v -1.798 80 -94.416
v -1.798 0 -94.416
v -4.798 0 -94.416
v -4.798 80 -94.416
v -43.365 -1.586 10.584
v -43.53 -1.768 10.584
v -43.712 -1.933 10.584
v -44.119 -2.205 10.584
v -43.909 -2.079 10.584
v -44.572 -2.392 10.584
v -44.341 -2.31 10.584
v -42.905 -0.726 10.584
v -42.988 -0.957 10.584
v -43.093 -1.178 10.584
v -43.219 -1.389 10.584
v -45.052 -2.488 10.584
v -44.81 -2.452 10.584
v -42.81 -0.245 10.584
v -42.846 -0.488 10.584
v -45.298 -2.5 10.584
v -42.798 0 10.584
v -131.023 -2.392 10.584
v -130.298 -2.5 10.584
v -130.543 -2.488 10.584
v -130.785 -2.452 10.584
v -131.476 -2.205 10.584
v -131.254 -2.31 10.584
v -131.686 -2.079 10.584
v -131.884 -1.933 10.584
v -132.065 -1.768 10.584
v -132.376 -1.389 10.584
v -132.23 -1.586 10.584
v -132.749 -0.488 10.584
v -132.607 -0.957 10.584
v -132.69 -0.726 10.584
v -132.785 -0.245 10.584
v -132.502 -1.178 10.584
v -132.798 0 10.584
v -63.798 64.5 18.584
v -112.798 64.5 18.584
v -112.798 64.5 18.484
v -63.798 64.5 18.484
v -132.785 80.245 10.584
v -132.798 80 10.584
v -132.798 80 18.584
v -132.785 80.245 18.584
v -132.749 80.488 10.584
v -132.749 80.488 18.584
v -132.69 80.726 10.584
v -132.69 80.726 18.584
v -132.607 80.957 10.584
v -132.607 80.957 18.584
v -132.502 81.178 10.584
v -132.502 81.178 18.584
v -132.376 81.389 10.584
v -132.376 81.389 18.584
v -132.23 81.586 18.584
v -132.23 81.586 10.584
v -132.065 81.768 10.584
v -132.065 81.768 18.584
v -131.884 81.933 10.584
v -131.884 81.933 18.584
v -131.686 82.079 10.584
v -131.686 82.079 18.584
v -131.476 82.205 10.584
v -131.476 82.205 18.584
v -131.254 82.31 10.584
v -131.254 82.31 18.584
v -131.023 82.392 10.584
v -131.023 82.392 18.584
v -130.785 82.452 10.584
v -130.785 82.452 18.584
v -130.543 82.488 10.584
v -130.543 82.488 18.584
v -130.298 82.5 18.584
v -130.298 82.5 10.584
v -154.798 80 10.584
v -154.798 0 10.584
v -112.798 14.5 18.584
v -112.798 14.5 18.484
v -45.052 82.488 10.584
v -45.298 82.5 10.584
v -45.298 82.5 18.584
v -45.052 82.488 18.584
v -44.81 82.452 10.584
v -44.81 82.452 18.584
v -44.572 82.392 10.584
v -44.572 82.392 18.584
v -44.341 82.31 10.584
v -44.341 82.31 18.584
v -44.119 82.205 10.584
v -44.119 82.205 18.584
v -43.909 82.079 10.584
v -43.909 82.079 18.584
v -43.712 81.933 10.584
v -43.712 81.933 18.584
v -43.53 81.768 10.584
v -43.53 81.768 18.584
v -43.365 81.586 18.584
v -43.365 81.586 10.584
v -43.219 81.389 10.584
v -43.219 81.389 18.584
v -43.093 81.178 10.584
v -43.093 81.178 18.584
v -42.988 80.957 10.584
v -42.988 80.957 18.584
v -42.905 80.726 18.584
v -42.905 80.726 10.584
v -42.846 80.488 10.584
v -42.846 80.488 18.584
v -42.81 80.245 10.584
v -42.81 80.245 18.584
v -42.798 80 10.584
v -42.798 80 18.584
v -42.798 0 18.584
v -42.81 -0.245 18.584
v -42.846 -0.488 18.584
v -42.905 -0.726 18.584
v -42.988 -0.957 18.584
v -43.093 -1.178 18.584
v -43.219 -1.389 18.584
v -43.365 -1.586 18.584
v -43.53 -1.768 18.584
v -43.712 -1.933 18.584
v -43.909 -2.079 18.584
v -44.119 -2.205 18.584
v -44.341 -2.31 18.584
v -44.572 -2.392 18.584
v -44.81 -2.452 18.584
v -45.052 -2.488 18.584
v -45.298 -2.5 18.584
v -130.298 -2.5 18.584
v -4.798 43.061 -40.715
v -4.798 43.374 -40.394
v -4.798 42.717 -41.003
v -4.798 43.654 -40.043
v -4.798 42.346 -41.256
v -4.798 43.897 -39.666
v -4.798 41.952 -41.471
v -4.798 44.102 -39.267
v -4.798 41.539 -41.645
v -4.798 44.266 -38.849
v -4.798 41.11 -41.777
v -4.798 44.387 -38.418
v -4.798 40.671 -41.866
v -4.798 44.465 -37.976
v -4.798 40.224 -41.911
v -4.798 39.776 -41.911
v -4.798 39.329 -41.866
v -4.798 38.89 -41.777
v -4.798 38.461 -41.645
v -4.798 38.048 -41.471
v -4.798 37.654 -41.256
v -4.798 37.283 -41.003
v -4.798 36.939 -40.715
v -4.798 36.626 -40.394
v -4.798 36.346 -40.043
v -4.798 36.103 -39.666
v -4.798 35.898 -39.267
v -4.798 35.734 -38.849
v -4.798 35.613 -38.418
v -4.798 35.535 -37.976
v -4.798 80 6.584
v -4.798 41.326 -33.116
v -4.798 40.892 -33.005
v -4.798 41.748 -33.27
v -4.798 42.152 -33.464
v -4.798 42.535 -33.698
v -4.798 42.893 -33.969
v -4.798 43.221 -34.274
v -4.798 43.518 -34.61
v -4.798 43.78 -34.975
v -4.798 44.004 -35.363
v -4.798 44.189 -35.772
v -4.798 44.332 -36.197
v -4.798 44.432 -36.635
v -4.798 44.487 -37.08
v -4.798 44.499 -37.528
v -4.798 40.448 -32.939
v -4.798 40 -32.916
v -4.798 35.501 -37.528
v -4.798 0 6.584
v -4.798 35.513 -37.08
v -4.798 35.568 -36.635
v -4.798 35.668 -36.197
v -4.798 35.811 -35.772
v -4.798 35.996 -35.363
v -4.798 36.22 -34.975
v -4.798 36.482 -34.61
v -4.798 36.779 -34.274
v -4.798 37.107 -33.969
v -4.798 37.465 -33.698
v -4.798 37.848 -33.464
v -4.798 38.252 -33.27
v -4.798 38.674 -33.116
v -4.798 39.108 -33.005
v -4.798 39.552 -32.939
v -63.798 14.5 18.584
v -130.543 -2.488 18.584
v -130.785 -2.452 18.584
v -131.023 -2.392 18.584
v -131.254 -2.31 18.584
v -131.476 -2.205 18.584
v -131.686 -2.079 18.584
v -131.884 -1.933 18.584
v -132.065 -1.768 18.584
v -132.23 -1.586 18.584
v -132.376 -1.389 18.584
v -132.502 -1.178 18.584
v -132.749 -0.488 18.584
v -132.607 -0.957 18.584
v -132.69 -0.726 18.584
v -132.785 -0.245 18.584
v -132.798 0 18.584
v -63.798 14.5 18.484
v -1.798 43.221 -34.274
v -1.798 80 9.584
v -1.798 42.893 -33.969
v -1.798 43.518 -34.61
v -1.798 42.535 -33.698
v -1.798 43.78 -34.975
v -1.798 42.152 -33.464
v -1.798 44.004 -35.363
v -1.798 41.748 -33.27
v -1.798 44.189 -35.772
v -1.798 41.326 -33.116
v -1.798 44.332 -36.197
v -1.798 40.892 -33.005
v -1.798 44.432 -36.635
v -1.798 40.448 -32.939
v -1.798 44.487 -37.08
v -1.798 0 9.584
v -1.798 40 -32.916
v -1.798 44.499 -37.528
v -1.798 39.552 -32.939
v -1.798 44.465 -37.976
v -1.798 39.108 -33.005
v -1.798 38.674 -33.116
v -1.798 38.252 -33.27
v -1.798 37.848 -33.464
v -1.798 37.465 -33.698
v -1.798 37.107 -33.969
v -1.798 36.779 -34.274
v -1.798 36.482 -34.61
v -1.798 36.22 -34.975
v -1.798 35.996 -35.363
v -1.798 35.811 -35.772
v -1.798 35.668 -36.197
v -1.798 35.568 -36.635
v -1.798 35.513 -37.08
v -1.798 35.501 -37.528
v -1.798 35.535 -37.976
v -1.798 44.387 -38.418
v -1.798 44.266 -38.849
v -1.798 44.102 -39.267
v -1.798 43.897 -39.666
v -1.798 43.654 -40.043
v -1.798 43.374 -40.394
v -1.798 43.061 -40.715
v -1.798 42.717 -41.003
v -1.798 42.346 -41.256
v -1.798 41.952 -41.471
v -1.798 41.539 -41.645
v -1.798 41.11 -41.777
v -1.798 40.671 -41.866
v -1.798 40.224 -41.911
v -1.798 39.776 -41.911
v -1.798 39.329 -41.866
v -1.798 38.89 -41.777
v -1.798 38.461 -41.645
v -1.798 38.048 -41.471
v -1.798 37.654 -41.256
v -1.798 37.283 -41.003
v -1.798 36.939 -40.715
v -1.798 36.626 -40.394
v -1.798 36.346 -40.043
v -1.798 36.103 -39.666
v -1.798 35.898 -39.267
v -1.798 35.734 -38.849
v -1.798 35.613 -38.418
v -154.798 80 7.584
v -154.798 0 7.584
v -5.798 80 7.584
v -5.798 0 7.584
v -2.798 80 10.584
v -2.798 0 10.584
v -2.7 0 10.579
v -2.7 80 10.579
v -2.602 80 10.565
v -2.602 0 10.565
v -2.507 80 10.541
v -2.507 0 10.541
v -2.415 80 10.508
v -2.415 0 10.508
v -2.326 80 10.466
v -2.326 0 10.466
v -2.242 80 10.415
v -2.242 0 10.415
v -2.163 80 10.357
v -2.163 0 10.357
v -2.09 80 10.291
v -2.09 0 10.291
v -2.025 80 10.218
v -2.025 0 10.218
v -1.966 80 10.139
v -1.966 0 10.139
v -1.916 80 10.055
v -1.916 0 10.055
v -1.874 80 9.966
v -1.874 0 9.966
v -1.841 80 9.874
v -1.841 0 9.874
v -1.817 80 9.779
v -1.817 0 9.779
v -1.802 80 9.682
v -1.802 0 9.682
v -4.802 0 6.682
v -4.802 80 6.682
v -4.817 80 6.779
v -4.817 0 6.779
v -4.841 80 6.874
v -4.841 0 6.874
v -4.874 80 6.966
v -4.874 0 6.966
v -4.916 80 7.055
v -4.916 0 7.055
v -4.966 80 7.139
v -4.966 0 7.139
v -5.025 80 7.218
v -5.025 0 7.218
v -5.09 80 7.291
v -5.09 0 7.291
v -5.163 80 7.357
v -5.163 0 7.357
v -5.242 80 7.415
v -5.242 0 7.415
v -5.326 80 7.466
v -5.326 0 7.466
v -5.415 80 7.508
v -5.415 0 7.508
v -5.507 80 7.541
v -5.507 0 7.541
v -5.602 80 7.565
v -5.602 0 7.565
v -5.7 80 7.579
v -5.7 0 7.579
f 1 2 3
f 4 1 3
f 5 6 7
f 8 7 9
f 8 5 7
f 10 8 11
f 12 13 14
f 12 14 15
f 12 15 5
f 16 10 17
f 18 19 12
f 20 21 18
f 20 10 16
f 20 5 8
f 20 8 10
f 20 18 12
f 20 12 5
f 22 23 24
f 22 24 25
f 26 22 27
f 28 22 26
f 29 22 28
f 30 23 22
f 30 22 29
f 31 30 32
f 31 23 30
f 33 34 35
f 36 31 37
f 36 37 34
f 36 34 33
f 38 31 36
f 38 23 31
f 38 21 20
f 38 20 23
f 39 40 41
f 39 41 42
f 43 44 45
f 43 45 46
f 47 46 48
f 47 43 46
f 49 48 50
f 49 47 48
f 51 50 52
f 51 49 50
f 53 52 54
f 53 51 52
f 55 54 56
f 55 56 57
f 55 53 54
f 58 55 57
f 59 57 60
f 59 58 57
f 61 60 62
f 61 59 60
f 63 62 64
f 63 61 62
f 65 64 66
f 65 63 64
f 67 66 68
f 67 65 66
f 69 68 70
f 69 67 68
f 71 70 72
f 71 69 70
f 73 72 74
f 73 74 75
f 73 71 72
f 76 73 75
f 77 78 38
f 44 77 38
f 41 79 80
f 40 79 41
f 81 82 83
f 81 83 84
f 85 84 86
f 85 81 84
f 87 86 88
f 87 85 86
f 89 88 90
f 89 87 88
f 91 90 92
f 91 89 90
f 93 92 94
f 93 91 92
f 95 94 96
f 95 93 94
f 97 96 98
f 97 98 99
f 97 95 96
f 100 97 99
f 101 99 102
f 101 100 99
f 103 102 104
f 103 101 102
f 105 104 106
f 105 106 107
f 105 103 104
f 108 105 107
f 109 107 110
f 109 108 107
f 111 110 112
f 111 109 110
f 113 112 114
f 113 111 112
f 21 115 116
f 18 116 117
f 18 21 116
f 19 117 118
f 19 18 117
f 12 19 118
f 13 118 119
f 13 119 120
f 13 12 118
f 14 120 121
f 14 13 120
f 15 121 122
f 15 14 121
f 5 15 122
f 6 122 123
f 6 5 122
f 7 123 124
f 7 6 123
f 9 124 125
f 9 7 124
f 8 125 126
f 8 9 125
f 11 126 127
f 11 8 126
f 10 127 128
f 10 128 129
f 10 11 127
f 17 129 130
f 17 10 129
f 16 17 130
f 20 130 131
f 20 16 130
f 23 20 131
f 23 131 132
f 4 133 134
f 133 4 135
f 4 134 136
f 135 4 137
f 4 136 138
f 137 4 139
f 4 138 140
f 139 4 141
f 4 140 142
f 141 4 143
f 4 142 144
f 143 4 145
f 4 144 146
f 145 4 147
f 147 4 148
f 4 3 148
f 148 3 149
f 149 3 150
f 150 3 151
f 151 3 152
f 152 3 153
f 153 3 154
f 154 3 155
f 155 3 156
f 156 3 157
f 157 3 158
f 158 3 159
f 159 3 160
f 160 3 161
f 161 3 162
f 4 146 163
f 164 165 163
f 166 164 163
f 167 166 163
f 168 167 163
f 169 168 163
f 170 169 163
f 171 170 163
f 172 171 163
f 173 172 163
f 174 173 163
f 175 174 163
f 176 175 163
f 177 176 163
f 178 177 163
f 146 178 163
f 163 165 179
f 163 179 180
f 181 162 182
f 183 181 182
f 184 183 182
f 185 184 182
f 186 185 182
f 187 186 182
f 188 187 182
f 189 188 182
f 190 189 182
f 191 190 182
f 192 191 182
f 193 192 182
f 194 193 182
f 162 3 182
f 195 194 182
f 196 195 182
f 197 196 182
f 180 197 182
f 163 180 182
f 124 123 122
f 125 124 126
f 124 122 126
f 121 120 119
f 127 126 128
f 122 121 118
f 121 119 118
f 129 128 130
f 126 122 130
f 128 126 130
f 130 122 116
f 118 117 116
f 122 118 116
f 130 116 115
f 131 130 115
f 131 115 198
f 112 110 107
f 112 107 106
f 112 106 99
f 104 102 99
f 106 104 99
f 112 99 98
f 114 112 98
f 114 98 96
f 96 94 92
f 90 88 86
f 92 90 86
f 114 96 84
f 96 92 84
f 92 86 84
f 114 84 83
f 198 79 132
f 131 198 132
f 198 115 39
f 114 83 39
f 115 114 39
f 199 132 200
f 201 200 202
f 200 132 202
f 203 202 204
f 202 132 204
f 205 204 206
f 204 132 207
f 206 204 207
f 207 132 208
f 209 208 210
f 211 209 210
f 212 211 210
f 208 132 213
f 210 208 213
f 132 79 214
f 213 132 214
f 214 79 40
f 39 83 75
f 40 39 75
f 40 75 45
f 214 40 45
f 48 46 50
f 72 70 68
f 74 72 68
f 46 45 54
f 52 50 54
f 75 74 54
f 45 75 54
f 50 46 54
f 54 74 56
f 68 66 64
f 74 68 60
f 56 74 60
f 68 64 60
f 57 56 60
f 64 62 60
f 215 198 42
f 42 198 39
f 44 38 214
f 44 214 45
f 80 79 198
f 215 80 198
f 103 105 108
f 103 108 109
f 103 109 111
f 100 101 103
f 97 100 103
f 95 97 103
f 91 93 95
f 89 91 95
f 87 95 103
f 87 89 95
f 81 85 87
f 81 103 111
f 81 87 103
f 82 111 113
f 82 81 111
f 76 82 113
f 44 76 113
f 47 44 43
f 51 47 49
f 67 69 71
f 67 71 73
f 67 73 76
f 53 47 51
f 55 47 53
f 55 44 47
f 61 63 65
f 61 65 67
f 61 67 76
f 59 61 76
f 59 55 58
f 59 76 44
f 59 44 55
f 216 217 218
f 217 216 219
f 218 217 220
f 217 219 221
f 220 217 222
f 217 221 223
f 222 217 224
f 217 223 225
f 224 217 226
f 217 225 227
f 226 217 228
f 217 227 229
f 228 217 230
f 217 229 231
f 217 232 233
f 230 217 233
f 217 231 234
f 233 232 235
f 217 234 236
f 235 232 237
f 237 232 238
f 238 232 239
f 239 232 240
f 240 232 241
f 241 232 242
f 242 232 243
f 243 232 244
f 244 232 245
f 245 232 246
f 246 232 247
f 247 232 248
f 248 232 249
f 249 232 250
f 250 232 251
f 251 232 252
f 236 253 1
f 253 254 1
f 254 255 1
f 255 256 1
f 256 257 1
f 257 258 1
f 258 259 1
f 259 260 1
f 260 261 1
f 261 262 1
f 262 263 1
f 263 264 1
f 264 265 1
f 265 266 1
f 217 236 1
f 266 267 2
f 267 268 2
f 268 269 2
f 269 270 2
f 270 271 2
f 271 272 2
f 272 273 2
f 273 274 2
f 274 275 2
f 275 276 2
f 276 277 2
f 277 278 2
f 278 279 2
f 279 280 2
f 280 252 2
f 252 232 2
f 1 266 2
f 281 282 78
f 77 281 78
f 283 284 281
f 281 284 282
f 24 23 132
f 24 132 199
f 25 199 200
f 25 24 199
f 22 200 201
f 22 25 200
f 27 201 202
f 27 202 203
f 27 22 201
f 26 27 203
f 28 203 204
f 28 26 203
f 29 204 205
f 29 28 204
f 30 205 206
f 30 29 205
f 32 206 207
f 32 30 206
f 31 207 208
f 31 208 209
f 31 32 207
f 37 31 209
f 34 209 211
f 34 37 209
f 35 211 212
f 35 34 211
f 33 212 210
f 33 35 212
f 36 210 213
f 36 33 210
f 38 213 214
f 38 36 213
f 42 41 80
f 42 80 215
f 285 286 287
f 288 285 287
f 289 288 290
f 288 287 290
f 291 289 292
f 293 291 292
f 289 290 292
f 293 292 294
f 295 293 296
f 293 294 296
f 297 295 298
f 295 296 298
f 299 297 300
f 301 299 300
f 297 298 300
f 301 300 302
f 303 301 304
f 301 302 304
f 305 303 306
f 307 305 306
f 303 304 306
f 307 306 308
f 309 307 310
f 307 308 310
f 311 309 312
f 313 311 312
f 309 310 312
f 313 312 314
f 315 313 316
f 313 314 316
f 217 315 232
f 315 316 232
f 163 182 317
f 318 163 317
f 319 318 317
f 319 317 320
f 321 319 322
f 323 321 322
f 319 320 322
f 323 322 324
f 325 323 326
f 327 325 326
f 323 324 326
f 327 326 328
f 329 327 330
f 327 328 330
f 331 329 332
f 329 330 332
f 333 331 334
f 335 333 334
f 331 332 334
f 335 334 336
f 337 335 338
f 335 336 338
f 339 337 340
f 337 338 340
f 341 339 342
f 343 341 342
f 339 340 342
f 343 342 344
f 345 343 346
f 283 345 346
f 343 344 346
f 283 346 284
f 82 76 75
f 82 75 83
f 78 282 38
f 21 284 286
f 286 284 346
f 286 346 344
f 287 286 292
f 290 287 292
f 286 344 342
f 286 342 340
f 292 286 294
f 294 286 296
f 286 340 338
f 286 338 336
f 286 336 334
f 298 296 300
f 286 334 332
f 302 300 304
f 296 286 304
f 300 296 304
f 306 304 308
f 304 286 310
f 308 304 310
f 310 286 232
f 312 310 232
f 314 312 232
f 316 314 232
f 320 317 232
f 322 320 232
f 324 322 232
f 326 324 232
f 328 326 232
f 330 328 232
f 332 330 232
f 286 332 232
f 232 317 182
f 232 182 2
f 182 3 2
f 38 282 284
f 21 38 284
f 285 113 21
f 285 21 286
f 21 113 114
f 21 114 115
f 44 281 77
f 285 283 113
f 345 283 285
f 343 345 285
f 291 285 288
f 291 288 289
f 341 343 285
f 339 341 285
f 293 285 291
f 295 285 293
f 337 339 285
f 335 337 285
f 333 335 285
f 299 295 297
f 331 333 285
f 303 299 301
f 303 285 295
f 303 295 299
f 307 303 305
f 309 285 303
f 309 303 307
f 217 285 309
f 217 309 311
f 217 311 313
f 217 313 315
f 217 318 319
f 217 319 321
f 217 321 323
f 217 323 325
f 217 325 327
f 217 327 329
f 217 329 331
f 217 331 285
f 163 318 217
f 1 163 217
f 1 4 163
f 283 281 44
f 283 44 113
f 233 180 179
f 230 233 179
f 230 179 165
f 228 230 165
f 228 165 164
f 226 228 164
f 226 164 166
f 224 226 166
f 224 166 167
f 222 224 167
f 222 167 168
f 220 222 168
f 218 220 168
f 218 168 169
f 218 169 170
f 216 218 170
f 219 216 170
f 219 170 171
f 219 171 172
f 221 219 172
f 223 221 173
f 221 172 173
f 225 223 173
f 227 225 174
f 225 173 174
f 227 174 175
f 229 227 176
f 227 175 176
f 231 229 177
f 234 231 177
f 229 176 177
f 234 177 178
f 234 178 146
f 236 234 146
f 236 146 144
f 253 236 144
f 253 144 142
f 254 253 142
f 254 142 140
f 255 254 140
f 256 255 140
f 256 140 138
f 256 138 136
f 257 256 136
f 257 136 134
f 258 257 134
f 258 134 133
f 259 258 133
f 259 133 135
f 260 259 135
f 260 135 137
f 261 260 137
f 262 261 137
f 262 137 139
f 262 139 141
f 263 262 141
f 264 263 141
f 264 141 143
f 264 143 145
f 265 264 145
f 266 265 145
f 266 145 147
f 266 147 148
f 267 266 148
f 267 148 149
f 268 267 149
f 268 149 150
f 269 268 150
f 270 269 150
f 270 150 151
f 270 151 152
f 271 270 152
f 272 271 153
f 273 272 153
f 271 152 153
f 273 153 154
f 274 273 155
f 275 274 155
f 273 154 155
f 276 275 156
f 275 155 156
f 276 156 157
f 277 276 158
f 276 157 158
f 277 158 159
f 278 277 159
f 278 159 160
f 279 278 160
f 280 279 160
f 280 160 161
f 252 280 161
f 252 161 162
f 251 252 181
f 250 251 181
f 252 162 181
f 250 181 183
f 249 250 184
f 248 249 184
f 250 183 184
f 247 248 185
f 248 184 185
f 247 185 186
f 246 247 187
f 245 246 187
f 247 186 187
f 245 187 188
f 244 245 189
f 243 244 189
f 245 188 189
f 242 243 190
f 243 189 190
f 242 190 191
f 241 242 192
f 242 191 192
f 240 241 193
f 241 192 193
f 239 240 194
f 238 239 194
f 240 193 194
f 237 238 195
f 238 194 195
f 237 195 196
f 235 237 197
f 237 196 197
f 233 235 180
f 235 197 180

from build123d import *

# Parameters (mm, degrees)
AUFSATZ_LINEAR_AUSTRAGEN1_DEPTH      = 80
AUFSATZ_LINEAR_AUSTRAGEN2_DEPTH      = 8
SKIZZE3_W                            = 49
SKIZZE3_H                            = 50
AUFSATZ_LINEAR_AUSTRAGEN4_DEPTH      = 0.5
AUFSATZ_LINEAR_AUSTRAGEN4_DEPTH_BACK = 0.1
DURCHGANGSLOCH_F_R_M81_D             = 9


with BuildPart() as part:
    # Skizze1 → Aufsatz-Linear austragen1 (new body)
    with BuildSketch(Plane(origin=(0, 0, 0), x_dir=(1, 0, 0), z_dir=(0, 1, 0))):
        with BuildLine():
            Line((-154.797525399, -7.583806671), (-154.797525399, -10.583806671))
            Line((-154.797525399, -10.583806671), (-2.797525399, -10.583806671))
            ThreePointArc((-2.797525399, -10.583806671), (-2.090418618, -10.290913452), (-1.797525399, -9.583806671))
            Line((-1.797525399, -9.583806671), (-1.797525399, 94.416193329))
            Line((-1.797525399, 94.416193329), (-4.797525399, 94.416193329))
            Line((-4.797525399, 94.416193329), (-4.797525399, -6.583806671))
            ThreePointArc((-4.797525399, -6.583806671), (-5.090418618, -7.290913452), (-5.797525399, -7.583806671))
            Line((-5.797525399, -7.583806671), (-154.797525399, -7.583806671))
        make_face()
    extrude(amount=AUFSATZ_LINEAR_AUSTRAGEN1_DEPTH)

    # Skizze2 → Aufsatz-Linear austragen2 (add)
    with BuildSketch(Plane.XY.offset(10.583806671)):
        with BuildLine():
            Line((-45.297525399, -2.5), (-130.297525399, -2.5))
            ThreePointArc((-130.297525399, -2.5), (-132.065292352, -1.767766953), (-132.797525399, 0))
            Line((-132.797525399, 0), (-132.797525399, 80))
            ThreePointArc((-132.797525399, 80), (-132.065292352, 81.767766953), (-130.297525399, 82.5))
            Line((-130.297525399, 82.5), (-45.297525399, 82.5))
            ThreePointArc((-45.297525399, 82.5), (-43.529758446, 81.767766953), (-42.797525399, 80))
            Line((-42.797525399, 80), (-42.797525399, 0))
            ThreePointArc((-42.797525399, 0), (-43.529758446, -1.767766953), (-45.297525399, -2.5))
        make_face()
    extrude(amount=AUFSATZ_LINEAR_AUSTRAGEN2_DEPTH)


with BuildPart() as body_2:
    # Skizze3 → Aufsatz-Linear austragen4 (new body, two sides)
    with BuildSketch(Plane.XY.offset(18.583806671)) as aufsatz_linear_austragen4_sk:
        with Locations((-88.297525399, 39.5)):
            Rectangle(SKIZZE3_W, SKIZZE3_H)
    extrude(amount=AUFSATZ_LINEAR_AUSTRAGEN4_DEPTH)
    extrude(aufsatz_linear_austragen4_sk.sketch, amount=-AUFSATZ_LINEAR_AUSTRAGEN4_DEPTH_BACK)


with BuildPart() as part_1:
    add(part.part)

    # Kombinieren1: cut body 2
    add(body_2.part, mode=Mode.SUBTRACT)

    # Durchgangsloch für M81 (through all)
    with Locations(Plane(origin=(-1.797525399, 0, 0), x_dir=(0, 0, -1), z_dir=(1, 0, 0))):
        with Locations((37.416193329, 40)):
            Hole(DURCHGANGSLOCH_F_R_M81_D / 2)


solid = part_1.part
